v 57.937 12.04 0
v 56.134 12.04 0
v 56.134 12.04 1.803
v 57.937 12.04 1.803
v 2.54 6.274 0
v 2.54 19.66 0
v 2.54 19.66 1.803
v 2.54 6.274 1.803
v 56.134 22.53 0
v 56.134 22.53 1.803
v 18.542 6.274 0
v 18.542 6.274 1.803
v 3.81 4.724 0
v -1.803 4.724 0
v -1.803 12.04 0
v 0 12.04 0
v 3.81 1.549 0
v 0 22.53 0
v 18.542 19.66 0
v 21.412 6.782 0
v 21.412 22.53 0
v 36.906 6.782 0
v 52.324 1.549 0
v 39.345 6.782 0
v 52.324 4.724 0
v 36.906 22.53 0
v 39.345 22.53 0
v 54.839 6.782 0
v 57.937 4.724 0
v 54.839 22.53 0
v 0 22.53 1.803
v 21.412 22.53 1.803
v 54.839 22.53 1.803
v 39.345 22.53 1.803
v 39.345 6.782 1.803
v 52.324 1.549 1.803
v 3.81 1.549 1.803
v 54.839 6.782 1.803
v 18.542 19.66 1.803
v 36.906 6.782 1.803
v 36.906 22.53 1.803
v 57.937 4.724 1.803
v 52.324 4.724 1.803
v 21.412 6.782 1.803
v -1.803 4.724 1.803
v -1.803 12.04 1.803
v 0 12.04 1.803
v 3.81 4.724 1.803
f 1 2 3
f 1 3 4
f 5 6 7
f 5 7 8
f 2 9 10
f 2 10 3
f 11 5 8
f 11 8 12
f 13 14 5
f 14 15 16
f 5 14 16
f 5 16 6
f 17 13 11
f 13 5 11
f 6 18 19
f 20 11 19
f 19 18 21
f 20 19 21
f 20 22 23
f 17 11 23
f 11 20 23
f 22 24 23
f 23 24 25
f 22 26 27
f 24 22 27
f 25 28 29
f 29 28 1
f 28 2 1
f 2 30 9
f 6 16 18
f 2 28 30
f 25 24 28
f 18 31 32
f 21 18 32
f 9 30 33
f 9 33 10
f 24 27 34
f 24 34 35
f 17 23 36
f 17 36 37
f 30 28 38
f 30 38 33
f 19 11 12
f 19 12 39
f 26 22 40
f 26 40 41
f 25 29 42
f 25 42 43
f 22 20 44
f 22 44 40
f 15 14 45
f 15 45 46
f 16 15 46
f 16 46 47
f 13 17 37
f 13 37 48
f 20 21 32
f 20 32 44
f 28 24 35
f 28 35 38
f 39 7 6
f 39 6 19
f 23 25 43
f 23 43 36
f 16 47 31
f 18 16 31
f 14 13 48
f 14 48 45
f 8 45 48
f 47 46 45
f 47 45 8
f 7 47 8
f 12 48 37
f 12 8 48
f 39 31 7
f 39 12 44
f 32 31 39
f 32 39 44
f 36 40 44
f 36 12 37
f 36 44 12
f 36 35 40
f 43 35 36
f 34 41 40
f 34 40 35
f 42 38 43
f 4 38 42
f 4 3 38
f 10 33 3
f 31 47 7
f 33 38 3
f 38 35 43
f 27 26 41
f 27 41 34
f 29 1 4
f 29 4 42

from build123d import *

# Parameters (mm, degrees)
BOSS_EXTRUDE1_DEPTH = 1.8034
SKETCH2_W           = 18.542
SKETCH2_H           = 2.8702
BOSS_EXTRUDE2_DEPTH = 1.8034


with BuildPart() as part:
    # Sketch1 → Boss-Extrude1 (new body)
    with BuildSketch(Plane.XY):
        Polygon((-1.8034, 12.0396), (0, 12.0396), (0, 19.6596), (2.54, 19.6596), (2.54, 6.2738), (18.542, 6.2738), (18.542, 22.5298), (21.4122, 22.5298), (21.4122, 6.7818), (36.9062, 6.7818), (36.9062, 22.5298), (39.3446, 22.5298), (39.3446, 6.7818), (54.8386, 6.7818), (54.8386, 22.5298), (56.134, 22.5298), (56.134, 12.0396), (57.9374, 12.0396), (57.9374, 4.7244), (52.324, 4.7244), (52.324, 1.5494), (3.81, 1.5494), (3.81, 4.7244), (-1.8034, 4.7244), align=None)
    extrude(amount=BOSS_EXTRUDE1_DEPTH)

    # Sketch2 → Boss-Extrude2 (add)
    with BuildSketch(Plane.XY.offset(1.8034)):
        with Locations((9.271, 21.0947)):
            Rectangle(SKETCH2_W, SKETCH2_H)
    extrude(amount=-BOSS_EXTRUDE2_DEPTH)


solid = part.part
